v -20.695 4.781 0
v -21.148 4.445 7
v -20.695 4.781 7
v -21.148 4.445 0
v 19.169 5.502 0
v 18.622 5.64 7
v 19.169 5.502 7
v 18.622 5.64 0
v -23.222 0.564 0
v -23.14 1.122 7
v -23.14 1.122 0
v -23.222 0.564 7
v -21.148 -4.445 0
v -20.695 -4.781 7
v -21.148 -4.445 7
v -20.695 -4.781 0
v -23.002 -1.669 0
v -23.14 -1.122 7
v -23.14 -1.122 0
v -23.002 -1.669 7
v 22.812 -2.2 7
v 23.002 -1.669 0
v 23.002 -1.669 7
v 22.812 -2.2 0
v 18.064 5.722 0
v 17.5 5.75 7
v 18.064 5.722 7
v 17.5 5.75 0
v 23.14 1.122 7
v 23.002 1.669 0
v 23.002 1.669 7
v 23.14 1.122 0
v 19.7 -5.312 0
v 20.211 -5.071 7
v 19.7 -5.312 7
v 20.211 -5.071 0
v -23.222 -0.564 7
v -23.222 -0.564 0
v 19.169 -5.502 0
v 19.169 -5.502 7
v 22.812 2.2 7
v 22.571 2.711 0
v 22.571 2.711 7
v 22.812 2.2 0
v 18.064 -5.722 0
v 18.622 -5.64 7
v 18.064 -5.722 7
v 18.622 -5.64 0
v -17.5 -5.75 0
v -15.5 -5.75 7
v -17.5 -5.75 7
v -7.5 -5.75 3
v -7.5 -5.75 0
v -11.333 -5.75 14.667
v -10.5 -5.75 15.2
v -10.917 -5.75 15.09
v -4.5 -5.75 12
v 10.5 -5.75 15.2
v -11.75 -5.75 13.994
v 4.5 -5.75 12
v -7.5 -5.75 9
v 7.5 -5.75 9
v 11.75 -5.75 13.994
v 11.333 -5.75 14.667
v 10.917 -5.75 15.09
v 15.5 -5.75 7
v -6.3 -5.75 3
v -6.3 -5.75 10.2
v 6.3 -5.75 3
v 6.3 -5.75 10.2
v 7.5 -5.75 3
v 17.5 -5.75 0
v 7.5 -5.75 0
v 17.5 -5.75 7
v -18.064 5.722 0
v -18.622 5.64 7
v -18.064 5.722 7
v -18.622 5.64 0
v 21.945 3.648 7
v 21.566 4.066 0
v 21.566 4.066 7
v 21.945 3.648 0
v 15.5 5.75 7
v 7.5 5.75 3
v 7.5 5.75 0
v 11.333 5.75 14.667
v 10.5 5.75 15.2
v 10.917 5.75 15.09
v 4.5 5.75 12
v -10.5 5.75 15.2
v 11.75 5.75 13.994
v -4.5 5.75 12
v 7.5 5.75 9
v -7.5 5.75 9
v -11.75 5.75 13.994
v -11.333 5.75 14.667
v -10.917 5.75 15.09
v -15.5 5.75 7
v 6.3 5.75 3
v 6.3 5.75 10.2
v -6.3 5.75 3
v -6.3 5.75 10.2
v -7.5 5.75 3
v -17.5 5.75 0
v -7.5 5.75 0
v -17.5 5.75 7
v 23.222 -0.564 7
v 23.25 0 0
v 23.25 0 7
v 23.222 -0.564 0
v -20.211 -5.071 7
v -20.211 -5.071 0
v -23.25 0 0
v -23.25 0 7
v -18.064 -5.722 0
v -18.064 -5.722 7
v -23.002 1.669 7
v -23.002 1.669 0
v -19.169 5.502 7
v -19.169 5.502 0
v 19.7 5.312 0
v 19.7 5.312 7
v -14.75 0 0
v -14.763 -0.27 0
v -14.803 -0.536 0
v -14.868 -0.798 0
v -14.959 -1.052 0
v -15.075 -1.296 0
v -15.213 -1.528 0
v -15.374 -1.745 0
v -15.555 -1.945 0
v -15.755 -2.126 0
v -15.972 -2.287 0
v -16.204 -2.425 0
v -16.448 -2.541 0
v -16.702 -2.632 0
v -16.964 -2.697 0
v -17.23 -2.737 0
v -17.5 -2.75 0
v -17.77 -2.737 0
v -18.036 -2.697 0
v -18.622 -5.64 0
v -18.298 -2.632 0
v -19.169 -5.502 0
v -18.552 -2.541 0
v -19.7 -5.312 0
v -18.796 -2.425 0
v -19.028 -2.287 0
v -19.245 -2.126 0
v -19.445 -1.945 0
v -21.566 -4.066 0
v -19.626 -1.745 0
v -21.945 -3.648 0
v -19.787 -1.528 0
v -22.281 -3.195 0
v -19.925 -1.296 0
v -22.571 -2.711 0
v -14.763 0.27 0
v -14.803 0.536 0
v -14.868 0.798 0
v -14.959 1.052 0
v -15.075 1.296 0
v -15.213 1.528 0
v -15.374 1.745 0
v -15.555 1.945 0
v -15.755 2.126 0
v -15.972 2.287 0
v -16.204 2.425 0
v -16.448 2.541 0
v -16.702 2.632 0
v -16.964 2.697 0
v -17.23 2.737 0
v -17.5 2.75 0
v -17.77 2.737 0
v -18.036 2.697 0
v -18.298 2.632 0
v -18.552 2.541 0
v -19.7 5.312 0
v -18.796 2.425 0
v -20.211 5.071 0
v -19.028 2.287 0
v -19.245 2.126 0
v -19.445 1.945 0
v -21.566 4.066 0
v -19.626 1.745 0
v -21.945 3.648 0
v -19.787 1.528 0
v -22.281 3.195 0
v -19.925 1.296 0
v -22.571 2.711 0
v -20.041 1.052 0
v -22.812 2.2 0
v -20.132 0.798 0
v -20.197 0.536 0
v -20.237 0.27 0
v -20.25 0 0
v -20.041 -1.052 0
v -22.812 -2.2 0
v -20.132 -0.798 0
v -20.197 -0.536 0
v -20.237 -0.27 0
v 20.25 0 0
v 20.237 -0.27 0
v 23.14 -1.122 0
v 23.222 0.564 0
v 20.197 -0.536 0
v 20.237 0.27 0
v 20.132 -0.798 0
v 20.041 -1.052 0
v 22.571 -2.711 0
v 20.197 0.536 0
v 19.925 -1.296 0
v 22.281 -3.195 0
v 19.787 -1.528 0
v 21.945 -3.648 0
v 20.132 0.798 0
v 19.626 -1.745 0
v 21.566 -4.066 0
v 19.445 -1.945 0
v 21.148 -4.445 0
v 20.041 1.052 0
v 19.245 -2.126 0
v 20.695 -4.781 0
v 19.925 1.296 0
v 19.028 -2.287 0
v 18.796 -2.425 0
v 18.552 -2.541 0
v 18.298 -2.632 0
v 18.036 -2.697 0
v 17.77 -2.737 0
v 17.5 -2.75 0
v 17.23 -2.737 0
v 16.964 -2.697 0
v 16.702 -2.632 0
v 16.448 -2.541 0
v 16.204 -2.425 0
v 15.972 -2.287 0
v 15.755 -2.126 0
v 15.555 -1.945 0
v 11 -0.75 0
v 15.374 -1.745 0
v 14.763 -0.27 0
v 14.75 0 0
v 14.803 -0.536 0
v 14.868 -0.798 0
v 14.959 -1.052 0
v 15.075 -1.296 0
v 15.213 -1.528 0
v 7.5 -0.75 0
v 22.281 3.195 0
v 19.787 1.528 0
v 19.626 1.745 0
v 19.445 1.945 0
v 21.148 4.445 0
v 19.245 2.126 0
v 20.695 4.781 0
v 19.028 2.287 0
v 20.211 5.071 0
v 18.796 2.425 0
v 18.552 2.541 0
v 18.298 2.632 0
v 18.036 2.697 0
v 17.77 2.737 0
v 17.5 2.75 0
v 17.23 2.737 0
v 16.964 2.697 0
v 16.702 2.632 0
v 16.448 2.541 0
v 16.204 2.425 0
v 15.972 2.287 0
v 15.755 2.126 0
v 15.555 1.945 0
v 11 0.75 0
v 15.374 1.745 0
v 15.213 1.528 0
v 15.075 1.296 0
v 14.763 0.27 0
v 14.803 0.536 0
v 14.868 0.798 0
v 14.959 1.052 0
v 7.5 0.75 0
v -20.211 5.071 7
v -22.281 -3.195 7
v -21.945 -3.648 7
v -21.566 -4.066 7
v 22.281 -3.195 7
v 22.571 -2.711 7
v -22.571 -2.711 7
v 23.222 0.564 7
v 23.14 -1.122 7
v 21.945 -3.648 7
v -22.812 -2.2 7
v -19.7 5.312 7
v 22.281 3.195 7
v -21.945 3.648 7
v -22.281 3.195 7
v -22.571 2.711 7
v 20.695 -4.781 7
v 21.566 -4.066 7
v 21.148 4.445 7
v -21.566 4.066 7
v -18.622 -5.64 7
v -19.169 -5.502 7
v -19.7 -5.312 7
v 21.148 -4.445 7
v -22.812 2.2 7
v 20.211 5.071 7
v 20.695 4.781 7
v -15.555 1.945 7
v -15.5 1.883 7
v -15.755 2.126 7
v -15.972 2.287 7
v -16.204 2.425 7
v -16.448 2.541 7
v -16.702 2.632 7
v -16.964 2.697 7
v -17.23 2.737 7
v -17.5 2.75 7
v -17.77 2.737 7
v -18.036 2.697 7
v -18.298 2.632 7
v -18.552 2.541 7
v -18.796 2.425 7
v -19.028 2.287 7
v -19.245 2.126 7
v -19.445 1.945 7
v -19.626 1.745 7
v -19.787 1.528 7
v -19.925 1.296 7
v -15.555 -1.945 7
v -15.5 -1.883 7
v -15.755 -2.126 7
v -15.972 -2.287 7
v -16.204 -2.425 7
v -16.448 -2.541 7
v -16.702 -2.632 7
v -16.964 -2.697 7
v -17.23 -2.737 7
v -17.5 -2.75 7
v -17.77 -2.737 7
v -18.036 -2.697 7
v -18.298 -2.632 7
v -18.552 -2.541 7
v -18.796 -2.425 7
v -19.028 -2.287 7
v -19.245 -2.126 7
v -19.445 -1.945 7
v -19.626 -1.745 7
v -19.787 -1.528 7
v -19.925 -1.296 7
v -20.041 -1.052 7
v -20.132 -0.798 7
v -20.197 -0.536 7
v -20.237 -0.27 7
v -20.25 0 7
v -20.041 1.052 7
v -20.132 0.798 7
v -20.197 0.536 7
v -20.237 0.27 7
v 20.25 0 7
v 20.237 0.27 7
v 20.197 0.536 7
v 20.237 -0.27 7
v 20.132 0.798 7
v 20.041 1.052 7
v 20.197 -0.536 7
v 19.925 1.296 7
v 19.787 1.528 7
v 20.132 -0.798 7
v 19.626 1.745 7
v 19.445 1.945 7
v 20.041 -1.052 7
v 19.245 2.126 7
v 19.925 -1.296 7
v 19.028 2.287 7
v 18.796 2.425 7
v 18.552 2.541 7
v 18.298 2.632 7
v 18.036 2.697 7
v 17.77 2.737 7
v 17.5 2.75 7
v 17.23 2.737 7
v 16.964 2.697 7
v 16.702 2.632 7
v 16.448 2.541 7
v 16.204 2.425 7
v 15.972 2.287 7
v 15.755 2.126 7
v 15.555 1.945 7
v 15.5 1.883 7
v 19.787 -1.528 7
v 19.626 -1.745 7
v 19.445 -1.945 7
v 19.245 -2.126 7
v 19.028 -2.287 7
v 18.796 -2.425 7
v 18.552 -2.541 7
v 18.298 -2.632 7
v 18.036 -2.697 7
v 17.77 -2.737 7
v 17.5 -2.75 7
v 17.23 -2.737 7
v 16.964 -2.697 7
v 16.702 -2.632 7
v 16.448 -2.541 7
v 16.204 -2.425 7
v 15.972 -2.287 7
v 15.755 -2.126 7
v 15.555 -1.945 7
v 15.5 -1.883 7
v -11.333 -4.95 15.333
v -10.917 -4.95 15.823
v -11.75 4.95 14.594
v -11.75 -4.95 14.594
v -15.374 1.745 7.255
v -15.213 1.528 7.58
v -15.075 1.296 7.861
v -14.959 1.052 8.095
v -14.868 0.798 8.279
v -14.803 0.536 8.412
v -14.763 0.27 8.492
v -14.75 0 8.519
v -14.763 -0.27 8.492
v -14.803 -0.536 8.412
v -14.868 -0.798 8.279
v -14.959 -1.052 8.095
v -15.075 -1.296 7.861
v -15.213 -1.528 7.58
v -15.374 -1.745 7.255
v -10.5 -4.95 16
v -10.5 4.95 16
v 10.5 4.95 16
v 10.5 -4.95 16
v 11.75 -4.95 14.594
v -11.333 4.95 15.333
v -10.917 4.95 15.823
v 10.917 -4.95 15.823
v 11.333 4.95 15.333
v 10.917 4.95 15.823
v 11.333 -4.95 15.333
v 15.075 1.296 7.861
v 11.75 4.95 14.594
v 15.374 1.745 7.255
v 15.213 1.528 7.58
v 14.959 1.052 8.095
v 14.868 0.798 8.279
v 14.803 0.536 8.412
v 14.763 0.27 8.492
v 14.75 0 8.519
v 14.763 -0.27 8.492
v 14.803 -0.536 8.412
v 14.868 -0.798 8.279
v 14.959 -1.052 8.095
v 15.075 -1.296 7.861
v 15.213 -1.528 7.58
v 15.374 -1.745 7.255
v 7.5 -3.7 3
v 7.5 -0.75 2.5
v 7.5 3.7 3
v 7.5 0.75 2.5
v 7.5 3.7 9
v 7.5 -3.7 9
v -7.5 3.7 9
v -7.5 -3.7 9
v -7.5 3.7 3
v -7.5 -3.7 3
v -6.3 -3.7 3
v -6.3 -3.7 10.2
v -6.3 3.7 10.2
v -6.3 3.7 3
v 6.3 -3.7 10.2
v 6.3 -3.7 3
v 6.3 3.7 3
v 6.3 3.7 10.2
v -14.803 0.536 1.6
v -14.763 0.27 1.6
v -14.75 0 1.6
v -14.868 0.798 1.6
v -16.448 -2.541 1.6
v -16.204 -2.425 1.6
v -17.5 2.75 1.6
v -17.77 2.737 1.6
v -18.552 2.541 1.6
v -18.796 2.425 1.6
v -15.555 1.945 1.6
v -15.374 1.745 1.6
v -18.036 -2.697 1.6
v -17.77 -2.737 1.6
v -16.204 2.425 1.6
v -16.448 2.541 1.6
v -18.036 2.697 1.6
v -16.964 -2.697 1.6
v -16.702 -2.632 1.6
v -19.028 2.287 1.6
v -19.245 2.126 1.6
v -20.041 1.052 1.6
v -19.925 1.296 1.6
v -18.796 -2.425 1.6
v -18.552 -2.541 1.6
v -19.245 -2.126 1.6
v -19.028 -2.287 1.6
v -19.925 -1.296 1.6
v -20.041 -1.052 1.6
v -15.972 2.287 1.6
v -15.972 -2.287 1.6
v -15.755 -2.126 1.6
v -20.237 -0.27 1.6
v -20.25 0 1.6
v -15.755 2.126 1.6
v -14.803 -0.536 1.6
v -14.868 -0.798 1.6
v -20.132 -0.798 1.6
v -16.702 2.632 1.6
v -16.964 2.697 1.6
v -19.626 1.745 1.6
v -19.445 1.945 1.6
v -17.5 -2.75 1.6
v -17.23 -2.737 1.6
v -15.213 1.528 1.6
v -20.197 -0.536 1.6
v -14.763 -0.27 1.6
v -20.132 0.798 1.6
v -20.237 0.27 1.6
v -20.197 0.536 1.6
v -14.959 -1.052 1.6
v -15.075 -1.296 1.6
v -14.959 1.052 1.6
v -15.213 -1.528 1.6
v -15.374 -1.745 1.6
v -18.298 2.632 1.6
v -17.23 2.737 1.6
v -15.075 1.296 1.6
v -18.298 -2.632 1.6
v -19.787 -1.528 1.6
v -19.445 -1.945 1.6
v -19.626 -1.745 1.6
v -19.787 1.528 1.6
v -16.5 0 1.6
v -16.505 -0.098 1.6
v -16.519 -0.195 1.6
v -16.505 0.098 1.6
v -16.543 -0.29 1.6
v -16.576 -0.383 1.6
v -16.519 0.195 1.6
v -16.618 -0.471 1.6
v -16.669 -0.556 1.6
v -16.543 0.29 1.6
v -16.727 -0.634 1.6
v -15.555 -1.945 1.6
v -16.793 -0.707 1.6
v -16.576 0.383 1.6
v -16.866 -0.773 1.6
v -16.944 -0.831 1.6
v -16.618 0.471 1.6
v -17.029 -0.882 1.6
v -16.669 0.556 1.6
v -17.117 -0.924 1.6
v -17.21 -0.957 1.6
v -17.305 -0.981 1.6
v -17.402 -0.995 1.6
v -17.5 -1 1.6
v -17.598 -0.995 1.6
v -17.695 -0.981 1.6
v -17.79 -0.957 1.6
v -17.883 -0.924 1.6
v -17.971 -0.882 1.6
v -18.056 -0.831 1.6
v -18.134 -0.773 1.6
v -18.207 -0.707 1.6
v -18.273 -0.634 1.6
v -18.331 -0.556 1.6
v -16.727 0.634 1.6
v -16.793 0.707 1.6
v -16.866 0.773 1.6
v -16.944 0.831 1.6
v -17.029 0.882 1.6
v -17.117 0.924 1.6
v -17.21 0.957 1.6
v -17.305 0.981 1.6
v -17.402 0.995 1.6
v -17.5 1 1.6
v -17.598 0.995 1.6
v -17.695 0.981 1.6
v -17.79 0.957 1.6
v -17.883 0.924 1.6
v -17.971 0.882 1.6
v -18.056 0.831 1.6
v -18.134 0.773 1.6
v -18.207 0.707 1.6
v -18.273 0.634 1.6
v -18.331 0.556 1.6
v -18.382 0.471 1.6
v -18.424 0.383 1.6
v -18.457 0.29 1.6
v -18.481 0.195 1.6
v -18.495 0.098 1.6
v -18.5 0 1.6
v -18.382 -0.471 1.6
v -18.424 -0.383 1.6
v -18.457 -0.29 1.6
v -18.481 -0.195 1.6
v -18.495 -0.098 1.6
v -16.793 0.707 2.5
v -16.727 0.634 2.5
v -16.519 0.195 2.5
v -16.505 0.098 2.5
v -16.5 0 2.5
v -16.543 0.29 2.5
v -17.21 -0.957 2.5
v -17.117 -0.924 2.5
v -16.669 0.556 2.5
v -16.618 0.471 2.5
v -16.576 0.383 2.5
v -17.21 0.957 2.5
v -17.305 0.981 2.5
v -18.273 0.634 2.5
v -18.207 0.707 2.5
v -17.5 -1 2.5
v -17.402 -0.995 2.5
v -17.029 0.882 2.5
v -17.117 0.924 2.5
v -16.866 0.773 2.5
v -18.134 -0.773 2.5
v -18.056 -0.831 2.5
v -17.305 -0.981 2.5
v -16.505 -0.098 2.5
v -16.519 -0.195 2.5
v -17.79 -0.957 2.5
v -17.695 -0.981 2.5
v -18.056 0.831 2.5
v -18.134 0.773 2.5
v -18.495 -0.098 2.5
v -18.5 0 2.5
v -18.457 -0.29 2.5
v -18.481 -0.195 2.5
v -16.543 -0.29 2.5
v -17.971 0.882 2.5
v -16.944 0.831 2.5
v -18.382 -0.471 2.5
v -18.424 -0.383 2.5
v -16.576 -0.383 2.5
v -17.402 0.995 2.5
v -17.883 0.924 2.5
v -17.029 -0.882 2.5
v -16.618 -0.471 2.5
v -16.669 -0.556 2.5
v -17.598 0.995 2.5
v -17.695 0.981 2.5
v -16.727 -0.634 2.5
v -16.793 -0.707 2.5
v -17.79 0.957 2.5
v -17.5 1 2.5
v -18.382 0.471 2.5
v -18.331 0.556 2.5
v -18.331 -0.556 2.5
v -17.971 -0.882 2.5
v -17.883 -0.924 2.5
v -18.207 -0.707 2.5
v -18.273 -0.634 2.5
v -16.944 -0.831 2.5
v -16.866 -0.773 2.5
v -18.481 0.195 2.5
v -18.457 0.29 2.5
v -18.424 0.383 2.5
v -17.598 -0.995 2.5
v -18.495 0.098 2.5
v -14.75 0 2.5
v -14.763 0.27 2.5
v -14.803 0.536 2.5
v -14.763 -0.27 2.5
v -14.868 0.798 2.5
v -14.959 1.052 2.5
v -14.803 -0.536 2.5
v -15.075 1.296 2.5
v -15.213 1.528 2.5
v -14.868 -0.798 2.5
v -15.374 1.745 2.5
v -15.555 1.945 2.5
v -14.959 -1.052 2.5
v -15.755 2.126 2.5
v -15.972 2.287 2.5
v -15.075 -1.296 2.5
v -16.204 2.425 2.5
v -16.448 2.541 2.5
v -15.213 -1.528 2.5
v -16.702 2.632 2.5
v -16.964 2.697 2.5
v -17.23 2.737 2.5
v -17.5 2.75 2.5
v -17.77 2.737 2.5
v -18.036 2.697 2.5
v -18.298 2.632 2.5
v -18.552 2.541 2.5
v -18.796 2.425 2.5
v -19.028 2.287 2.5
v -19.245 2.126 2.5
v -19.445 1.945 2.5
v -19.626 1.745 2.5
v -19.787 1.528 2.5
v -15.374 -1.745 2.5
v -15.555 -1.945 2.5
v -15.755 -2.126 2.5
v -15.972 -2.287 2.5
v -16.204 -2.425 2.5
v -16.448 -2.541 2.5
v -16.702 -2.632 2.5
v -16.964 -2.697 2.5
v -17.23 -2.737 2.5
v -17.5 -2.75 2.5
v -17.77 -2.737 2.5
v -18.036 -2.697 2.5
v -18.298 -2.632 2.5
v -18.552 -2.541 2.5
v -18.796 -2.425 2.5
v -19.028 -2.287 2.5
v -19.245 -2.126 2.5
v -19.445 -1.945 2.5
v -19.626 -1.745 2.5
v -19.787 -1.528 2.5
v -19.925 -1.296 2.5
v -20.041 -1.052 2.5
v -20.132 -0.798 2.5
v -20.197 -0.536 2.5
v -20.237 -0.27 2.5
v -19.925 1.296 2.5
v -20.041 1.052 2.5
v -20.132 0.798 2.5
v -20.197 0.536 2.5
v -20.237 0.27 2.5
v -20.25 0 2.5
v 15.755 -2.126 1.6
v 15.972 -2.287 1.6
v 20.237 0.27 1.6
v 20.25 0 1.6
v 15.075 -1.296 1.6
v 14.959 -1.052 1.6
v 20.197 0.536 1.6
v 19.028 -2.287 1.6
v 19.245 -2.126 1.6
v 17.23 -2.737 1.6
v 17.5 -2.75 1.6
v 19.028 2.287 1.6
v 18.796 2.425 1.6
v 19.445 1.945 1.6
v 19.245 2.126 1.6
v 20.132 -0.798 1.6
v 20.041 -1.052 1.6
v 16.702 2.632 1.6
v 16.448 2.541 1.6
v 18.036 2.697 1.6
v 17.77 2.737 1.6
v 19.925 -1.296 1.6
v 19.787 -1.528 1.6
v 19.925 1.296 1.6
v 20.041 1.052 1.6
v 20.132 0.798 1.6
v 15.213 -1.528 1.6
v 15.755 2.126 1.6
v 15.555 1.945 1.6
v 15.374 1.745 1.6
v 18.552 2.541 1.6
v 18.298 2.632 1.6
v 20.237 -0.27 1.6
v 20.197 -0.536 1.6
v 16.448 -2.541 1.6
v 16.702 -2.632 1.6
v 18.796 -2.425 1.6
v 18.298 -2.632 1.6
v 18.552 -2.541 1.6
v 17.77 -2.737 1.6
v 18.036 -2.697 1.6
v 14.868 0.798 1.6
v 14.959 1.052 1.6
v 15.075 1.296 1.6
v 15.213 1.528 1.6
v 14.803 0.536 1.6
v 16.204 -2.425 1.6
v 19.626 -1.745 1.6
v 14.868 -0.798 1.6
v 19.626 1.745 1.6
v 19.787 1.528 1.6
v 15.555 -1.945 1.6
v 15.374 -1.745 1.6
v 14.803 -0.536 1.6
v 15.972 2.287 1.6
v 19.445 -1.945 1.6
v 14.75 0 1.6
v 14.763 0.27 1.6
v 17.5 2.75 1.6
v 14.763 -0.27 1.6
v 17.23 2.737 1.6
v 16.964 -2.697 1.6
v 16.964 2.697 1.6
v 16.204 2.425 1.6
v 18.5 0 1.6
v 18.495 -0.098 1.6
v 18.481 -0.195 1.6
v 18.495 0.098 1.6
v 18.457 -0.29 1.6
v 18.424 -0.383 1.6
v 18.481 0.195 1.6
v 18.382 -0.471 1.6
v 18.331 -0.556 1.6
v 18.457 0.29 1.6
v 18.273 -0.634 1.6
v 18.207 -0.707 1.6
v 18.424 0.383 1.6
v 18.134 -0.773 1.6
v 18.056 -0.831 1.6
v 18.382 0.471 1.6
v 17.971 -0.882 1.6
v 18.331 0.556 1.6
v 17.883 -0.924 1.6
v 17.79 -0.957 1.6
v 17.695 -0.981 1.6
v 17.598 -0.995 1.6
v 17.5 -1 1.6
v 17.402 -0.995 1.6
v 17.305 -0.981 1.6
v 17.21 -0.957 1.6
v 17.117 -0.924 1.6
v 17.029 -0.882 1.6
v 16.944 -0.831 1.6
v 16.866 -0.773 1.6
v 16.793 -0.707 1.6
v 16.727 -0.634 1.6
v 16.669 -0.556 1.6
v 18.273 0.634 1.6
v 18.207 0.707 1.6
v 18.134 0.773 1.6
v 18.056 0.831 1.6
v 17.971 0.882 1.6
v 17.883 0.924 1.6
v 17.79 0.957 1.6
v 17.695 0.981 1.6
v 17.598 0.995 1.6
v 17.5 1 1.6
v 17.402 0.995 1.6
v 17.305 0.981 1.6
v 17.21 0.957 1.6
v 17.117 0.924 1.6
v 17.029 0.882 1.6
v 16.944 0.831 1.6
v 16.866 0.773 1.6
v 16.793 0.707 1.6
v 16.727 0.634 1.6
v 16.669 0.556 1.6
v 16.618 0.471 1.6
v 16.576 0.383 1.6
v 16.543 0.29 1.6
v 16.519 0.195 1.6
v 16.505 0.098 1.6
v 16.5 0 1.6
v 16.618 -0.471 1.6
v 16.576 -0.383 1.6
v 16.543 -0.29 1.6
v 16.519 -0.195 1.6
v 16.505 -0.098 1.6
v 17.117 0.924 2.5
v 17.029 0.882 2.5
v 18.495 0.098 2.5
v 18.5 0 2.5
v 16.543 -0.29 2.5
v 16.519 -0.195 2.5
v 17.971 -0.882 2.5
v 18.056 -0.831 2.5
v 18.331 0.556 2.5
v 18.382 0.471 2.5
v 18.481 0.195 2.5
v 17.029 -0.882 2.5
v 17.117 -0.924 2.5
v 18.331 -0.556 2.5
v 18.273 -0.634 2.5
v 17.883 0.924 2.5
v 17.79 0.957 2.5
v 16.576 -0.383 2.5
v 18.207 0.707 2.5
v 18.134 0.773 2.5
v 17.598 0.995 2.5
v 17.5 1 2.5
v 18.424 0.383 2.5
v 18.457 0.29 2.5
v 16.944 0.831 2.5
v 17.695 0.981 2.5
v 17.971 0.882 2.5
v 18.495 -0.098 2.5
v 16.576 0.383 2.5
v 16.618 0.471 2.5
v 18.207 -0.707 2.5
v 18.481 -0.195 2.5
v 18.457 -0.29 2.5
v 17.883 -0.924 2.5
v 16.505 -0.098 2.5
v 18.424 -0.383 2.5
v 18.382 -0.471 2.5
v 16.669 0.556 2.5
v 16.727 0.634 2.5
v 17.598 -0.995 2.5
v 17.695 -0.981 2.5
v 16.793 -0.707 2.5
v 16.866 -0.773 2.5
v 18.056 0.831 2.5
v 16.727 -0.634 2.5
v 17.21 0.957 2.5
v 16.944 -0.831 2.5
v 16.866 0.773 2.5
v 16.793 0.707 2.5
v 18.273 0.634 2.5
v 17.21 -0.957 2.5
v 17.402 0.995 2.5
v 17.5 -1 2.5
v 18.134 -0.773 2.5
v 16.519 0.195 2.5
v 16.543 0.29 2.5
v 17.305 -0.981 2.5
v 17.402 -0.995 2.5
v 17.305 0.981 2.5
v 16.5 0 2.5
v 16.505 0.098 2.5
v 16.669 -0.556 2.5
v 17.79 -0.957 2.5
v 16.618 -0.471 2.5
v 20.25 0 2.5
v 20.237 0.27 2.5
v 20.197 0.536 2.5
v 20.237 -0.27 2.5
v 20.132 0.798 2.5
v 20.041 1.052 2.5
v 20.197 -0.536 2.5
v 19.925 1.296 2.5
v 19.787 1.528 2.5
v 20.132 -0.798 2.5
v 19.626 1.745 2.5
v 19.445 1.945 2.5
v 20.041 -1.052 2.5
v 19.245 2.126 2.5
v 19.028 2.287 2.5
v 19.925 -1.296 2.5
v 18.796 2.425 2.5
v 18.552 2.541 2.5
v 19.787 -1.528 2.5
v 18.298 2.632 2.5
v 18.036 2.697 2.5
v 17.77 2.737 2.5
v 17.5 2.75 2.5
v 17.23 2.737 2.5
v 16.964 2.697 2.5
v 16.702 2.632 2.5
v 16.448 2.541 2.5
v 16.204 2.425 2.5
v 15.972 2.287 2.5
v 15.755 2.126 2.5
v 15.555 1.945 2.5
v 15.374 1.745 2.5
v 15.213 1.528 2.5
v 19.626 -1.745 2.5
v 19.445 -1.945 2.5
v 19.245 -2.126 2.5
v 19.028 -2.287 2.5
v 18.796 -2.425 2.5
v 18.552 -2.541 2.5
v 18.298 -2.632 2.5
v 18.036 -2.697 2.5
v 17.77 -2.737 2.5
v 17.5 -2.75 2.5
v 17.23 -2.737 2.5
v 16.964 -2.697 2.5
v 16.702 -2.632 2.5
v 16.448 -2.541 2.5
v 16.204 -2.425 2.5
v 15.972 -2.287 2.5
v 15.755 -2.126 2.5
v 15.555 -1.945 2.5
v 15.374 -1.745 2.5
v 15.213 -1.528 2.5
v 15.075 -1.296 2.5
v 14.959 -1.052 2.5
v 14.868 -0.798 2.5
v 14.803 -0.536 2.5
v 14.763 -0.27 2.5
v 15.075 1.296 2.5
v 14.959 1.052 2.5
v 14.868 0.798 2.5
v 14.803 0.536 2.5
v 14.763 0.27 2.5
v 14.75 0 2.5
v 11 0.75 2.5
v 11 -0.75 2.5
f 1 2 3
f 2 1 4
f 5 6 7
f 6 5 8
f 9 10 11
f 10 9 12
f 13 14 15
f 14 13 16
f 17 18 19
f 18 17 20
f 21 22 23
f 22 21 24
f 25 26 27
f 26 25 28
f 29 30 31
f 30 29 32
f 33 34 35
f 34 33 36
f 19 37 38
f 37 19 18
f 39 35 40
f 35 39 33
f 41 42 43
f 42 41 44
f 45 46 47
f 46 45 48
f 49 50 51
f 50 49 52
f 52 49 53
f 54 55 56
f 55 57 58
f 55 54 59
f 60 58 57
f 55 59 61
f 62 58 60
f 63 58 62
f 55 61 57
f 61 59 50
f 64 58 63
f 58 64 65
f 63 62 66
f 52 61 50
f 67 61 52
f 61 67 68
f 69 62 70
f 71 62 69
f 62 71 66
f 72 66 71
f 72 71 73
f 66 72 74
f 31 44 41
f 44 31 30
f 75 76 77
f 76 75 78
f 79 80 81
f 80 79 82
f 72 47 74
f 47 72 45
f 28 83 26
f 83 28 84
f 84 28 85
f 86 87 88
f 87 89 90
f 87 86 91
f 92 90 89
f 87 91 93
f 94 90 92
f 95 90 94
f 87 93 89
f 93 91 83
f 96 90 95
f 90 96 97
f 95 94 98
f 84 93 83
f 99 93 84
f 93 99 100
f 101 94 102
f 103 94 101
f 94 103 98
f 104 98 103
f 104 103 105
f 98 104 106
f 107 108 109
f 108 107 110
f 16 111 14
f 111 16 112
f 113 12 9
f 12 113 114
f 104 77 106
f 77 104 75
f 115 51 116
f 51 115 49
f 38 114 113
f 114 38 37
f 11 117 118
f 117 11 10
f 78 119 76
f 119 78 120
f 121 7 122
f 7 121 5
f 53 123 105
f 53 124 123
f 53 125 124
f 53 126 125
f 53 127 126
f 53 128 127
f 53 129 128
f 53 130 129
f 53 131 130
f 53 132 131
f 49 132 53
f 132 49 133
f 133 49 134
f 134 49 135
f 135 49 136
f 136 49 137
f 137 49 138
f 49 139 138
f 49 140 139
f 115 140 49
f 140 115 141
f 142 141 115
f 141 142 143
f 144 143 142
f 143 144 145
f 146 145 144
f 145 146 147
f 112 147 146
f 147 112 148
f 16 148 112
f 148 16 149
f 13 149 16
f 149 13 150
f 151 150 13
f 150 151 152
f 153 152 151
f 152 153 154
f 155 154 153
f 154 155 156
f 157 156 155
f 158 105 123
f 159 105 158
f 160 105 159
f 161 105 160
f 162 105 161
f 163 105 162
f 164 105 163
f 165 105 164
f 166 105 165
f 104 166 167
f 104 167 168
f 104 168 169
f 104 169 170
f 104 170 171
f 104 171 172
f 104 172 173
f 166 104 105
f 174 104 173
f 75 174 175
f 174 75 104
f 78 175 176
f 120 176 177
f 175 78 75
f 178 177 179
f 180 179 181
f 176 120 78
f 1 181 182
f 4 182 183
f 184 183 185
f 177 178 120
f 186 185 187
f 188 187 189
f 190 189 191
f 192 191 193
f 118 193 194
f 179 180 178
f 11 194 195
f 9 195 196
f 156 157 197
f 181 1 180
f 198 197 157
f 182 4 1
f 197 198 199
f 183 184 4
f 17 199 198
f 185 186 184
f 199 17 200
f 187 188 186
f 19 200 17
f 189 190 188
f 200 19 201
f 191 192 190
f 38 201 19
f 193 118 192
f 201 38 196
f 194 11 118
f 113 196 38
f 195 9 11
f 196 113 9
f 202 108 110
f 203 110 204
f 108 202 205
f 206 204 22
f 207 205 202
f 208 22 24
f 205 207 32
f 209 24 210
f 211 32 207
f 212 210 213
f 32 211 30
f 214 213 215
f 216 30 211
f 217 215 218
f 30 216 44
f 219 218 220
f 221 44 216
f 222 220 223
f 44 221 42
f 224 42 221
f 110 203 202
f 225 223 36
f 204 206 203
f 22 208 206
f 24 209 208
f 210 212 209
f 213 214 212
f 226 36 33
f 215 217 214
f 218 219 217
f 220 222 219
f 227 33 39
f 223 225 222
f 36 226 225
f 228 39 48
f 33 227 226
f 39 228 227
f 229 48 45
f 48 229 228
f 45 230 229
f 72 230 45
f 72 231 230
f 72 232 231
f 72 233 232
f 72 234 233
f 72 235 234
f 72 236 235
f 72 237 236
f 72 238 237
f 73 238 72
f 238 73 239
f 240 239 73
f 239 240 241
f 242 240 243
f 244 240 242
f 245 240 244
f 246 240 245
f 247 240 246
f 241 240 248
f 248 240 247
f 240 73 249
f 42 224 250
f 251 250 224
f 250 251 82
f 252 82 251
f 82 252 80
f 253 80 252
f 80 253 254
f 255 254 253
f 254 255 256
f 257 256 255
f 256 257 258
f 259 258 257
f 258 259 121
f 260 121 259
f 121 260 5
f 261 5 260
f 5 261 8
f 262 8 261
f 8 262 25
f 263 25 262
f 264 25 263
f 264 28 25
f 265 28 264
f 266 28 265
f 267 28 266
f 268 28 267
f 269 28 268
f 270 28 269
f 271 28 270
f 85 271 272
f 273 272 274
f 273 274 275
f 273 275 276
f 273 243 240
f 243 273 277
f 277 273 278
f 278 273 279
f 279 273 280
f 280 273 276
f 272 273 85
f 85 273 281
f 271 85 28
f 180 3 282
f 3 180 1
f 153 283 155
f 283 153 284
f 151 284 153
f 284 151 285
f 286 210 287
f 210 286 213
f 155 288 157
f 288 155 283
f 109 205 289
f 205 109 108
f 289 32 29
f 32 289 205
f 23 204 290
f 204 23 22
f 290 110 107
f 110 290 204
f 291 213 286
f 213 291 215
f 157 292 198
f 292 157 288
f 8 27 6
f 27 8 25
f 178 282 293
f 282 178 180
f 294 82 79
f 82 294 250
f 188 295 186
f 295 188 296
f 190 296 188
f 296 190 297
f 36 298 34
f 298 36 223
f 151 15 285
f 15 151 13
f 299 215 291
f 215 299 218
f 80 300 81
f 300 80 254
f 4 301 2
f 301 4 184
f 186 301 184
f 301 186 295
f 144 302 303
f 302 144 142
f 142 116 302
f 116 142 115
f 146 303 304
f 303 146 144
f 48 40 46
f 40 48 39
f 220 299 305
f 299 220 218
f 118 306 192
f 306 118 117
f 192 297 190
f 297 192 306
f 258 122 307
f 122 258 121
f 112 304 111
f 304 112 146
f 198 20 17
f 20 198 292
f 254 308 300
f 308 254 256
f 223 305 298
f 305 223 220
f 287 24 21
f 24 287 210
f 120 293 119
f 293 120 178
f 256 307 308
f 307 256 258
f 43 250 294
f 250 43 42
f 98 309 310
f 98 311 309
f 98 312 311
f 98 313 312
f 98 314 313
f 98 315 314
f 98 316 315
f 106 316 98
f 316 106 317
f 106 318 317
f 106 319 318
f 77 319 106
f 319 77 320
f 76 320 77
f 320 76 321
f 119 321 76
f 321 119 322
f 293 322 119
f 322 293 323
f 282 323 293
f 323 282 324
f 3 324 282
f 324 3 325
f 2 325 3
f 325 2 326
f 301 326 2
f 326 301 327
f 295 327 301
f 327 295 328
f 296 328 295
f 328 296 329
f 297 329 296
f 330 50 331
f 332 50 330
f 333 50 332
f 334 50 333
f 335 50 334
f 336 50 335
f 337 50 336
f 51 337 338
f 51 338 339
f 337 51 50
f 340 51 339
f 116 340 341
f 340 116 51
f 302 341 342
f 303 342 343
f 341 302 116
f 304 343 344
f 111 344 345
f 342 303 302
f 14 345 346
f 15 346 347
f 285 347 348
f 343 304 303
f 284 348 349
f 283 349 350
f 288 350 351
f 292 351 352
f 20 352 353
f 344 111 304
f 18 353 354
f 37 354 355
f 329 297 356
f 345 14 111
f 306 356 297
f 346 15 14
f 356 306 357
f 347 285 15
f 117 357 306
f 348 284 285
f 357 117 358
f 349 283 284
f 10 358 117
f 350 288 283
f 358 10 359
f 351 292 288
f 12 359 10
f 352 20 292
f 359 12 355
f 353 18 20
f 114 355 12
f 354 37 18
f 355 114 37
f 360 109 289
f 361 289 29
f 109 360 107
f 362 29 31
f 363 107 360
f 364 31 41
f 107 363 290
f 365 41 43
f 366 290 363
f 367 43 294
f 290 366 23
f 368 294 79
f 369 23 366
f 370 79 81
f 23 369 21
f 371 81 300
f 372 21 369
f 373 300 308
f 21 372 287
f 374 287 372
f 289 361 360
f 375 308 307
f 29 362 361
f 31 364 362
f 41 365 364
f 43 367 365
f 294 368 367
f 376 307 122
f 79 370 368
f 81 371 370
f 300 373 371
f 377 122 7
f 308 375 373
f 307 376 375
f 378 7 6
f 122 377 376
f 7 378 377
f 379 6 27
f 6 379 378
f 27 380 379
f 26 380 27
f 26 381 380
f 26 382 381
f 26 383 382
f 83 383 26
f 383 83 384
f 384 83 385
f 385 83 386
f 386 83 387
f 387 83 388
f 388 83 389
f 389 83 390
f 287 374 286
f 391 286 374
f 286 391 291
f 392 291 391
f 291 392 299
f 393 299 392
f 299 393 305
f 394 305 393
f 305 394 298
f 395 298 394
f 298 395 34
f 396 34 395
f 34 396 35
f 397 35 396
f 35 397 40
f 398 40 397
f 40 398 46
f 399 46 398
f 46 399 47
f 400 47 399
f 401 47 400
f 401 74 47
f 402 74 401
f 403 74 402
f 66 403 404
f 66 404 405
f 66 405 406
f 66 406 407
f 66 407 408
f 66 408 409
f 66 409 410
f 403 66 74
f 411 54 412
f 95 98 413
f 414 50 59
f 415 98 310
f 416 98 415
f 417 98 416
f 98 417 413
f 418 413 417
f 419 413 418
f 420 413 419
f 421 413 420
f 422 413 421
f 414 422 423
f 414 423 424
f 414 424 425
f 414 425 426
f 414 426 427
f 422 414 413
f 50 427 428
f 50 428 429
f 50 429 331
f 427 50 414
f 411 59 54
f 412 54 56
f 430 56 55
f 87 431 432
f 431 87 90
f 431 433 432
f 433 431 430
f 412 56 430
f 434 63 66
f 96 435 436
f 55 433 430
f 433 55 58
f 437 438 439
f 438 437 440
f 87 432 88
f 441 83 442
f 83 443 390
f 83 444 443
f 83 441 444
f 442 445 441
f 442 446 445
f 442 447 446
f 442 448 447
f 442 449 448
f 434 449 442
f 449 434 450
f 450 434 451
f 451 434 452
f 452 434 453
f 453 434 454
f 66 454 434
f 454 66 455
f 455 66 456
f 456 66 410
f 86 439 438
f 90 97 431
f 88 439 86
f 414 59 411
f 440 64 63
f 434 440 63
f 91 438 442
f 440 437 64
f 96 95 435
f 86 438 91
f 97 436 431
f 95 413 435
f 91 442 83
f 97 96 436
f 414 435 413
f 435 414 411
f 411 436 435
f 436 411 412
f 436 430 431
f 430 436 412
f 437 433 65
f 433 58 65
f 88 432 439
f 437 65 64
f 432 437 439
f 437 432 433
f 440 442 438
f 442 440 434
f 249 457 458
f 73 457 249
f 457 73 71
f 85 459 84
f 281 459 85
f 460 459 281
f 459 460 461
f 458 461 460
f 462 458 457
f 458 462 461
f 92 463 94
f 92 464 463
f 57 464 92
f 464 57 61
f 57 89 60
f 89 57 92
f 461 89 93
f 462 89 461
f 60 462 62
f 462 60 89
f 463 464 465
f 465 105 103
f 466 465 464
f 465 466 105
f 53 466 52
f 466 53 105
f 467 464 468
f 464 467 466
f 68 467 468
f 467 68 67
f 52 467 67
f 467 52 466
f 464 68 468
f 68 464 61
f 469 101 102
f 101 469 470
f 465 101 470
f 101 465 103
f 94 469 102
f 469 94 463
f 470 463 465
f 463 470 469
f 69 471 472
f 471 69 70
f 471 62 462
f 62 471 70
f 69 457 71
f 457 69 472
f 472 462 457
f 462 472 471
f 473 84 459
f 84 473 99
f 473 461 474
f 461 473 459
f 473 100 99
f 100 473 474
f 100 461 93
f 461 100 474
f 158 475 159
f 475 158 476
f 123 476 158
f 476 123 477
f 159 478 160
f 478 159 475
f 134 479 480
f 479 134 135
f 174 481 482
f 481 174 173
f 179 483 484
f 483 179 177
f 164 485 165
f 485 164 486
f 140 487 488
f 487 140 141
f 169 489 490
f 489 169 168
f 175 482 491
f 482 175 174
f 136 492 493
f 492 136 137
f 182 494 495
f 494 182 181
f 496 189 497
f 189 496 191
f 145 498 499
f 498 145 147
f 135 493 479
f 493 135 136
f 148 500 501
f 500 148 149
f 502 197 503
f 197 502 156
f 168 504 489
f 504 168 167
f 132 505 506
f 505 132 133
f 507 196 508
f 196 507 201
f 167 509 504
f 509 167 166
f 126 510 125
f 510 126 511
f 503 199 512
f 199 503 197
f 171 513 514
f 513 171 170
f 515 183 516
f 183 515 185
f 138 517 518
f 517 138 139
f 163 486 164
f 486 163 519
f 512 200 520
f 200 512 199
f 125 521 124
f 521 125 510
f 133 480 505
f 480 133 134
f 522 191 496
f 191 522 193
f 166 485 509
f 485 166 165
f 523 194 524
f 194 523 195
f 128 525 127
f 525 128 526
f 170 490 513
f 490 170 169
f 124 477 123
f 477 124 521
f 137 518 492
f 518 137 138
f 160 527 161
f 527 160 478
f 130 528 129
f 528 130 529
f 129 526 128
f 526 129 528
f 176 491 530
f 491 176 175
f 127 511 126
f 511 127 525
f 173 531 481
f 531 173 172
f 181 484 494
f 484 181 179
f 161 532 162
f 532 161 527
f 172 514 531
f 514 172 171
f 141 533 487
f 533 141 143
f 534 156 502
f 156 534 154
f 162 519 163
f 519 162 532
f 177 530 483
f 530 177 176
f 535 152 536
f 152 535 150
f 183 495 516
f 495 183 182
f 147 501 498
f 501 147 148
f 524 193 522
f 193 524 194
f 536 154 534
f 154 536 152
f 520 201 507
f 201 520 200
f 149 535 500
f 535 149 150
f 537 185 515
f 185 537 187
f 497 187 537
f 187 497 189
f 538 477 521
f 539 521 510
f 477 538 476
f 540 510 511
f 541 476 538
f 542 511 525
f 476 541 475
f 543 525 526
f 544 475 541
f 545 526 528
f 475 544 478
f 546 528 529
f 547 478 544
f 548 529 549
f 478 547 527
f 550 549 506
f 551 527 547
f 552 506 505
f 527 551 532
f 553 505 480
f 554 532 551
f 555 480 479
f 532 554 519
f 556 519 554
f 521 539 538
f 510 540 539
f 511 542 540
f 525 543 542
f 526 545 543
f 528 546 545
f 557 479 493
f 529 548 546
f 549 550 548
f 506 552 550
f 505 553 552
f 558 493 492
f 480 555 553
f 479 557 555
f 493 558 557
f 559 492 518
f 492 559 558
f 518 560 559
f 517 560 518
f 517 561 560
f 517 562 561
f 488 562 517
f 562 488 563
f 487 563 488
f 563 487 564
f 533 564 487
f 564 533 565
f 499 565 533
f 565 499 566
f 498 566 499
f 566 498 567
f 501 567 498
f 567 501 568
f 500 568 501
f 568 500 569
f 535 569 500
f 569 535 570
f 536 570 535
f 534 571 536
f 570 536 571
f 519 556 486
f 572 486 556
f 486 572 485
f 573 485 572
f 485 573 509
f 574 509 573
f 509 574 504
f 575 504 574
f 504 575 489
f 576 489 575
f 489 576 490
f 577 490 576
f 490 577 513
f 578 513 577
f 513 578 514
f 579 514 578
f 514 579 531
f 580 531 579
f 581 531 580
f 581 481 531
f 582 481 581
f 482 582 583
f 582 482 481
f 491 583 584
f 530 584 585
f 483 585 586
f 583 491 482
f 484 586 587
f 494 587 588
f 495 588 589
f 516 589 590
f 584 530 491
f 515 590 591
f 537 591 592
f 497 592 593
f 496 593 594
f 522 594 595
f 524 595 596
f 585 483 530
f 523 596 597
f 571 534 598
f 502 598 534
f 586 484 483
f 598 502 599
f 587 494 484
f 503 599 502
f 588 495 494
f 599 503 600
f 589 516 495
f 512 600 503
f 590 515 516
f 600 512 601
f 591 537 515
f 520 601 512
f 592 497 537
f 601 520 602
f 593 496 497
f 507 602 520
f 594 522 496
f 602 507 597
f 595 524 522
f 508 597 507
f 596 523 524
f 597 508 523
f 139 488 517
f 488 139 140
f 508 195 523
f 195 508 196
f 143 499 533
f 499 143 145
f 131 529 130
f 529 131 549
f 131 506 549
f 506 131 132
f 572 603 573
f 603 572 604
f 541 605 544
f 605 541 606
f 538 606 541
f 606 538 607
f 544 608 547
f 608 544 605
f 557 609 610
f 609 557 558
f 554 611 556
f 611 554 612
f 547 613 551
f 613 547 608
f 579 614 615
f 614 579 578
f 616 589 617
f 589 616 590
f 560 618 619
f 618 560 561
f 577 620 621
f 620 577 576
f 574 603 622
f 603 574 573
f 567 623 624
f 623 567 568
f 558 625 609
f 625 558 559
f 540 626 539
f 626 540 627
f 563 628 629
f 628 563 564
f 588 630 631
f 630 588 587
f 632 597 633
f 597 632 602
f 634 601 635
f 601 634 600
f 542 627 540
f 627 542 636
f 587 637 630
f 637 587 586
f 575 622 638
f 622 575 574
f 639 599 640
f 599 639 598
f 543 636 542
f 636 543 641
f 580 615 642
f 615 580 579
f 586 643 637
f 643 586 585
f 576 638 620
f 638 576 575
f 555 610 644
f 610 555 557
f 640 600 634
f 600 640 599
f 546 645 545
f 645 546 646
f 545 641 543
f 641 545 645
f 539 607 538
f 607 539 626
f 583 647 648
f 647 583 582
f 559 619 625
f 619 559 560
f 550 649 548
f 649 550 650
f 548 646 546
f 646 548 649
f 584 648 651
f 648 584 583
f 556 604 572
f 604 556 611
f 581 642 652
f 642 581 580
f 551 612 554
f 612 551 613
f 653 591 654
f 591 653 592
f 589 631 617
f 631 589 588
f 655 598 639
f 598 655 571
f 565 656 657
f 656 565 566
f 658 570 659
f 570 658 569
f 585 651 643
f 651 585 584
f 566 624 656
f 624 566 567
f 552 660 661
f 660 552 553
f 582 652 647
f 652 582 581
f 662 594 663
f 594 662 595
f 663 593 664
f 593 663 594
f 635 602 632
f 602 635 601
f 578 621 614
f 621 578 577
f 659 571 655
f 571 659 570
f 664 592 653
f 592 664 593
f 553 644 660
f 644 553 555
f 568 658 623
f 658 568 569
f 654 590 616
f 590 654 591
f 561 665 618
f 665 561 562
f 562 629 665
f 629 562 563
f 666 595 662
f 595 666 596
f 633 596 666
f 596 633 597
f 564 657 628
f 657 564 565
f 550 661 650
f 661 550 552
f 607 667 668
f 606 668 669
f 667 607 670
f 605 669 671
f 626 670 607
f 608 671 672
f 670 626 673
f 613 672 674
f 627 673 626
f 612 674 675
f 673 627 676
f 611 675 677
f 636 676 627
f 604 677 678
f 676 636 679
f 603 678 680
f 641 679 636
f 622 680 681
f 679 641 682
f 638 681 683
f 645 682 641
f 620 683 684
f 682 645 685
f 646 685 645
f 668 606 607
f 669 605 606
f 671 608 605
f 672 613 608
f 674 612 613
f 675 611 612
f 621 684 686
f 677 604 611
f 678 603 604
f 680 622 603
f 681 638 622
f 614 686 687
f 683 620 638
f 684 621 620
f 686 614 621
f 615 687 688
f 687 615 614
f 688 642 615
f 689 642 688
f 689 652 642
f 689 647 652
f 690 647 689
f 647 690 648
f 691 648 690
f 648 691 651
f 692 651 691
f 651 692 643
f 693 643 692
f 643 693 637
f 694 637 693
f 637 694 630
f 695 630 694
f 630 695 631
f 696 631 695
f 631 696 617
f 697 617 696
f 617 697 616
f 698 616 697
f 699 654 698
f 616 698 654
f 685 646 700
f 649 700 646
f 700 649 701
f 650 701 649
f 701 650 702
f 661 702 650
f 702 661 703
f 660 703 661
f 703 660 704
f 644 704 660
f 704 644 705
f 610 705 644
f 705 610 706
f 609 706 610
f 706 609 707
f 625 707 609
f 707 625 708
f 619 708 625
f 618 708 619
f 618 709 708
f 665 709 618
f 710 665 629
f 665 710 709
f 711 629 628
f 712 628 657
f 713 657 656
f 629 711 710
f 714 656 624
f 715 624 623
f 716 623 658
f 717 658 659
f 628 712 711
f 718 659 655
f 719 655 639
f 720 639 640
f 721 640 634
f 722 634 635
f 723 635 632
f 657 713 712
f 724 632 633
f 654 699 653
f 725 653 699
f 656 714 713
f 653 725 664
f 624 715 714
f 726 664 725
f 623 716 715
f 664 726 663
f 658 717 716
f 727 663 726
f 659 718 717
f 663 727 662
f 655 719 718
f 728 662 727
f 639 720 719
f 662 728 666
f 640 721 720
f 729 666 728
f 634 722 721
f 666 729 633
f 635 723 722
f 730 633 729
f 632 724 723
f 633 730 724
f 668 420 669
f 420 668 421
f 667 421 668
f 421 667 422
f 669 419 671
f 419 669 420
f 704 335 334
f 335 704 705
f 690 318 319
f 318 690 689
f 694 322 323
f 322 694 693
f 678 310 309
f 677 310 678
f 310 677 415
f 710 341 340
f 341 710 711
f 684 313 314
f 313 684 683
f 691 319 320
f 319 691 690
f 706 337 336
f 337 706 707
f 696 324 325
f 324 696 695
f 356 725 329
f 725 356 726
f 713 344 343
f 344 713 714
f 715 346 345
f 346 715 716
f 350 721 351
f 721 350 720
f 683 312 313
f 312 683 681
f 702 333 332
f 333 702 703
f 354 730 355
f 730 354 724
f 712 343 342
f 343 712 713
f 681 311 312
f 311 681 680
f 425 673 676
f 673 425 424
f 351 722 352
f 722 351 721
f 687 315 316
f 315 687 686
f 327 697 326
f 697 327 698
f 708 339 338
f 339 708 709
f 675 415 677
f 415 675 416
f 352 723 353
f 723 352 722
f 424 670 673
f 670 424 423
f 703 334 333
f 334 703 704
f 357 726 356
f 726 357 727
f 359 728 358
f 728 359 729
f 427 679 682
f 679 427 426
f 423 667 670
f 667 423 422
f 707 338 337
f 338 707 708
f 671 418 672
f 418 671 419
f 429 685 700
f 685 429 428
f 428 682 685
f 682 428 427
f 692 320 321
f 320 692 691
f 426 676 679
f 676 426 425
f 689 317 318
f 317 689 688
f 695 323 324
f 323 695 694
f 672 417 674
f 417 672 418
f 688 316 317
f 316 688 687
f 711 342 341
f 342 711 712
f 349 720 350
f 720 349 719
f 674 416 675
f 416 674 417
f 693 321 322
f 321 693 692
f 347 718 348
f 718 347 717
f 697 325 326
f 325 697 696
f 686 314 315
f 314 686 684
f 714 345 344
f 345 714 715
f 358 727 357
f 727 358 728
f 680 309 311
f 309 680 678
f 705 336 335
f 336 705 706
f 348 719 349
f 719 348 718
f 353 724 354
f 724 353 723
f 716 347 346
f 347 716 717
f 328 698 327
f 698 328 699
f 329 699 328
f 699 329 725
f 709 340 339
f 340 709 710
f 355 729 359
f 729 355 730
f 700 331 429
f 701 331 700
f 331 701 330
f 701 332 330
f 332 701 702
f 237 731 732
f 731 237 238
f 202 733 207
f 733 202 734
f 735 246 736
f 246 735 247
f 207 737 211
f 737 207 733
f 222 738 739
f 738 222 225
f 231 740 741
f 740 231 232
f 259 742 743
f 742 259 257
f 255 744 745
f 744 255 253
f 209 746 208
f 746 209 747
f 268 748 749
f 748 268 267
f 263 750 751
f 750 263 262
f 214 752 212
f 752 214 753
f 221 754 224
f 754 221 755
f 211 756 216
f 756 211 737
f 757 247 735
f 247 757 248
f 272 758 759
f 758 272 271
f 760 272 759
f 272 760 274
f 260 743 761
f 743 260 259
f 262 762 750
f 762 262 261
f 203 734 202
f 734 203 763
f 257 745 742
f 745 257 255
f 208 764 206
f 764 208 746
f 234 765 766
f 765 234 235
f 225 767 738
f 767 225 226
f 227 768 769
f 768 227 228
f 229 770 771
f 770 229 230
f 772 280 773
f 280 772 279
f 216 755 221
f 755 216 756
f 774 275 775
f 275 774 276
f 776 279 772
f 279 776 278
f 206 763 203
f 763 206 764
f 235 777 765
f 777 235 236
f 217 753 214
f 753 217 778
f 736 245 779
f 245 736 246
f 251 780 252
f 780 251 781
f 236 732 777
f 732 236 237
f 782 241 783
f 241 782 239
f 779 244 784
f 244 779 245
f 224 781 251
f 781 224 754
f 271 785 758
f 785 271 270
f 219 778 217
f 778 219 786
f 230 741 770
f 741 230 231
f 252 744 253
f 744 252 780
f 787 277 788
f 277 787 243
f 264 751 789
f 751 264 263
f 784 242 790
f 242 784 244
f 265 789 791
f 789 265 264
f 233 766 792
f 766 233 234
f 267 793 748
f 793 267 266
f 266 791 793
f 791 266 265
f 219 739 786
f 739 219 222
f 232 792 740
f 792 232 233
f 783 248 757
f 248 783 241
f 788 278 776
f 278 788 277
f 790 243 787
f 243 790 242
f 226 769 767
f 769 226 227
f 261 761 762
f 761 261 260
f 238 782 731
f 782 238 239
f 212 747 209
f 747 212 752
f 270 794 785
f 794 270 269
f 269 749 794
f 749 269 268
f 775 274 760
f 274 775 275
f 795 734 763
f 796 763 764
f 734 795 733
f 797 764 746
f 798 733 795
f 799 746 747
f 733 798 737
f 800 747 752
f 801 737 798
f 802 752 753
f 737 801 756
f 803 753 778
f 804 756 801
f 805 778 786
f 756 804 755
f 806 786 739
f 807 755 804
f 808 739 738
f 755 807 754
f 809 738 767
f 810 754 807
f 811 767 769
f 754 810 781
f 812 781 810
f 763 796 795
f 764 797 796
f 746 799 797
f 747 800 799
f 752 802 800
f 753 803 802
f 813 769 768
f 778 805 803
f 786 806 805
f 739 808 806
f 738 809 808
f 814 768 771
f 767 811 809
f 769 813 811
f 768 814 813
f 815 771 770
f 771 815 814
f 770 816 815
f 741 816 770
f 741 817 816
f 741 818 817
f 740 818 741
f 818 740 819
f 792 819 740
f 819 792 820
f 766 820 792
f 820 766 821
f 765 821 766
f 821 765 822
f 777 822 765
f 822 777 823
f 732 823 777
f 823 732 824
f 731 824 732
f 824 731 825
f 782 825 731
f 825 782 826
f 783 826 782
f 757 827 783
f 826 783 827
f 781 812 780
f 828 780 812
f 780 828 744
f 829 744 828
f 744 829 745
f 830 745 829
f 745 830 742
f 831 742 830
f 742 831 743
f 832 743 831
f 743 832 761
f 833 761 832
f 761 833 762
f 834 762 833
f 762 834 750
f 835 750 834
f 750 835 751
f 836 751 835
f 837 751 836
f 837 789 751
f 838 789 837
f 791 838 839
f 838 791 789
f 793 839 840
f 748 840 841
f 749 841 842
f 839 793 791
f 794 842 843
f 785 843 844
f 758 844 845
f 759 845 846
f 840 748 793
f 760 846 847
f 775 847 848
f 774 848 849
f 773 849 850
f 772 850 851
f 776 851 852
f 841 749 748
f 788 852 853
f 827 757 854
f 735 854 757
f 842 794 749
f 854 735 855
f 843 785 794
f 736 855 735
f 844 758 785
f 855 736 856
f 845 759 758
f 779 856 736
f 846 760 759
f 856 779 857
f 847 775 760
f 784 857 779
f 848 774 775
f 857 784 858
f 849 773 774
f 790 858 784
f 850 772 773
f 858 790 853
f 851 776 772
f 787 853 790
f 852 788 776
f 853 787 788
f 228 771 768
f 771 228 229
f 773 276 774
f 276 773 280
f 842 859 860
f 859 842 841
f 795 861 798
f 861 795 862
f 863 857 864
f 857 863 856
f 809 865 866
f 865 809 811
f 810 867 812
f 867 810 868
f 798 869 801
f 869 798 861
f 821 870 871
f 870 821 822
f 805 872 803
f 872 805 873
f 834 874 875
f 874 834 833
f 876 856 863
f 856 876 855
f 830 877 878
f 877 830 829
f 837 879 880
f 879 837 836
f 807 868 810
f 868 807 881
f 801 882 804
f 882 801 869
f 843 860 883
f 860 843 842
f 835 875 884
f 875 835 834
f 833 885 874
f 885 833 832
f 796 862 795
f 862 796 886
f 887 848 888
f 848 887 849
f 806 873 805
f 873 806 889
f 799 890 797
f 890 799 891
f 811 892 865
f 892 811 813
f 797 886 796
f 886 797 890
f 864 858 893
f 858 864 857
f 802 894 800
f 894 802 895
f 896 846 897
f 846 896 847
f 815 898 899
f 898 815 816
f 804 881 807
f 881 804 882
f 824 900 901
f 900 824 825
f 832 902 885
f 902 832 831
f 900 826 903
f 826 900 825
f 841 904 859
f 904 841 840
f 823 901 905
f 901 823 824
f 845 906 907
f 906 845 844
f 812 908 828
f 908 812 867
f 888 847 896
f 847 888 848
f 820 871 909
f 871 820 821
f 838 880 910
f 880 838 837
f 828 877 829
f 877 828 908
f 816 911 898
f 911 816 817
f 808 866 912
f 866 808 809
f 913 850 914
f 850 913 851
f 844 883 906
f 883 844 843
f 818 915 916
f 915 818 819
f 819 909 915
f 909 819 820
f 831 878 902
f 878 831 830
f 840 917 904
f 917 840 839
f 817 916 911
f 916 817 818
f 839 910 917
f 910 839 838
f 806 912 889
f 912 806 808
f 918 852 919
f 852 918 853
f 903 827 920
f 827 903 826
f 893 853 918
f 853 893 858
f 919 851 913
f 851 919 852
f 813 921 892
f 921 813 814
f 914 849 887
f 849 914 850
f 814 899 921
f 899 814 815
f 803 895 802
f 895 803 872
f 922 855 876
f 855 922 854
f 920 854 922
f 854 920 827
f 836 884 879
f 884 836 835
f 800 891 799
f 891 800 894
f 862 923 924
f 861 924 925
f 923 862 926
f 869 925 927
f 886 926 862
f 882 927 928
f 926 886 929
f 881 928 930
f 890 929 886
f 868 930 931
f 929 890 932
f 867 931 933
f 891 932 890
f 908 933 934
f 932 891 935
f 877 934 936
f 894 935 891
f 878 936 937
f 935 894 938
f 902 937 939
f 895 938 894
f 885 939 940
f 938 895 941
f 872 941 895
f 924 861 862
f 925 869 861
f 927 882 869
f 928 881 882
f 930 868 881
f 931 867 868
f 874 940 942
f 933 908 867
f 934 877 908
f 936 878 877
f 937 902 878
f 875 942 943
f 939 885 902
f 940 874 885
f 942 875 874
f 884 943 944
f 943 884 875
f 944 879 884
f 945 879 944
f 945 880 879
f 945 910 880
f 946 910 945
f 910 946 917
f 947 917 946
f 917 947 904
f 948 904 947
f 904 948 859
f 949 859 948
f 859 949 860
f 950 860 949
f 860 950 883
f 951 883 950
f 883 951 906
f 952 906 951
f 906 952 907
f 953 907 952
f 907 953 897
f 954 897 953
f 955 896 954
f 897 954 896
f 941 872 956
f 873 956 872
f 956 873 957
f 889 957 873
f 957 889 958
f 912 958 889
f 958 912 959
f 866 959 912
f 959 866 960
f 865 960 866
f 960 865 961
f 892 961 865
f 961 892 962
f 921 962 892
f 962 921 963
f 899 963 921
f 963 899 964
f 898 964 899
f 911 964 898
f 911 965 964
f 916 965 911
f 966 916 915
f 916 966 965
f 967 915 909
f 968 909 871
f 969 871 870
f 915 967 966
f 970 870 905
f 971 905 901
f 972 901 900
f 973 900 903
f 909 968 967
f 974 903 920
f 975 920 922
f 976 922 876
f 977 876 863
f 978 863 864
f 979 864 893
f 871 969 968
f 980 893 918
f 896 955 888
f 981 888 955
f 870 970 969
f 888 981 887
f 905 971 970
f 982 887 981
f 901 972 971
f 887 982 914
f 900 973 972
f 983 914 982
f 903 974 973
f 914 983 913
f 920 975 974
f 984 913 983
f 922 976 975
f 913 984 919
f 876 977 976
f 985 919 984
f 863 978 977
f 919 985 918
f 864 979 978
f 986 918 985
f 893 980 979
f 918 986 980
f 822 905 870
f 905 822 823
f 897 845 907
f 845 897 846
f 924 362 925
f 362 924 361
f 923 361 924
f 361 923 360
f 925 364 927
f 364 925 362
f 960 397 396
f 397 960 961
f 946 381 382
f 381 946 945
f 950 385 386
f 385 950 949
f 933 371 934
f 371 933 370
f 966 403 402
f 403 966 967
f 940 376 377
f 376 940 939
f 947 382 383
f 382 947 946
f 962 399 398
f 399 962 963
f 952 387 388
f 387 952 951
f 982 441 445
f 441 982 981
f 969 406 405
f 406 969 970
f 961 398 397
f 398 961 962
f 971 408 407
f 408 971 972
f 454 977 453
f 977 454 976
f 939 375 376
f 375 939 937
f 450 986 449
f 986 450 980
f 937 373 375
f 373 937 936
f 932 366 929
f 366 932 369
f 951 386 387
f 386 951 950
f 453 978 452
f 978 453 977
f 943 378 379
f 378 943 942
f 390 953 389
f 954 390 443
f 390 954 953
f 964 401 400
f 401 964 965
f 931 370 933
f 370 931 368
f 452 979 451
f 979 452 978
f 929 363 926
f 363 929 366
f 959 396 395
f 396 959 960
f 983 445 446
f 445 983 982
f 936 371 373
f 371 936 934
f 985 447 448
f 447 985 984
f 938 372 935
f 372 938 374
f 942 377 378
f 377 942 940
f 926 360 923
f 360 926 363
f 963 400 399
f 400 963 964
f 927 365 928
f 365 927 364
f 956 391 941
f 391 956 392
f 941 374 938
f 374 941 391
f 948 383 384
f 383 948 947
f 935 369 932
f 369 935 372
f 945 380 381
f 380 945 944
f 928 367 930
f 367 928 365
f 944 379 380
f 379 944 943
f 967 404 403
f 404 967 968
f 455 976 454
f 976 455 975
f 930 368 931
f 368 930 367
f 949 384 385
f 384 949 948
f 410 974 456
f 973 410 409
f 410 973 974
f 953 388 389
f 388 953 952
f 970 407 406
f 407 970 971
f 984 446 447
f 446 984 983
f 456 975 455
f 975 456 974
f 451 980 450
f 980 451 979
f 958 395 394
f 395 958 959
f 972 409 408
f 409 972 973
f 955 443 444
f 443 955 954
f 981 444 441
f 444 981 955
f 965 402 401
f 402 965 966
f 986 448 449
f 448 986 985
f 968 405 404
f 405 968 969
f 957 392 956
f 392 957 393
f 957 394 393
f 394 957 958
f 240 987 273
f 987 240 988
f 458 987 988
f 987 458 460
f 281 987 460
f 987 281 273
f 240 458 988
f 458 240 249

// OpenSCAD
// Walkie Talkie Carabiner Attachment Arch
// This arch attaches to a walkie talkie via two studs and provides
// a permanent carabiner attachment point.

// ============================================
// DIMENSIONS
// ============================================

// Basic pill shape dimensions
attachment_length = 46.5;    // Length of the walkie talkie attachment
attachment_width = 11.5;     // Width of the walkie talkie attachment
attachment_height = 7;       // Height/tall dimension (Z direction)
rounding_diameter = attachment_width; // Diameter of the rounding (matches width)

// Screw hole dimensions
stud_hole_diameter = 5.5;       // Bottom hole for stud (5mm wide)
stud_hole_depth = 1.6;        // Depth of stud hole (1.6mm)
screw_shaft_diameter = 2;     // Screw shaft diameter (2mm)
screw_head_diameter = 5.5;    // Screw head diameter (5.5mm)
screw_head_start = 2.5;         // Height where screw head starts (4mm from bottom)

// Arch cutout dimensions
arch_cutout_width = 15;      // Width of the arch cutout (X direction)
carabiner_clearance_height = 12; // Height above Z=0 for the carabiner opening
arch_top_thickness = 4;      // Material thickness above the carabiner opening
arch_shoulder_width = 3;     // Extra material on each side of the opening
arch_ramp_width = 5;         // Width of each sloped shoulder above the base
arch_profile_steps = 12;     // Smoothness of each curved shoulder
top_edge_chamfer = 0.8;      // Chamfer around the raised bridge top edge
inner_arch_chamfer = 3;      // Chamfer on the upper inside corners of the opening
arch_top_height = carabiner_clearance_height + arch_top_thickness;

// TPU insert side guide dimensions
tpu_insert_width = 7;
tpu_insert_y_clearance = 0.4;
tpu_insert_bottom_trim = 3;
tpu_side_guide_x = 1.2;

// Keying slot dimensions
keying_slot_y = 1.5;    // Width of the keying slot (Y direction, perpendicular to line)
keying_slot_z = 2.5;    // Depth of the keying slot (Z direction)
keying_slot_x = 3.5;  // Distance extending from cutout edge (X direction)

// Quality settings
$fn = 64;  // Number of fragments for circles/cylinders (higher = smoother, slower to render)


// ============================================
// MAIN ARCH MODEL
// ============================================
// Coordinate system:
// X: along the length (left to right)
// Y: width (front to back)
// Z: height/tall (upward)

module attachment_profile() {
    hull() {
        translate([-attachment_length/2 + rounding_diameter/2, 0])
            circle(d=rounding_diameter);

        translate([attachment_length/2 - rounding_diameter/2, 0])
            circle(d=rounding_diameter);
    }
}

module xz_extrude(width) {
    translate([0, width/2, 0])
        rotate([90, 0, 0])
            linear_extrude(height=width)
                children();
}

module raised_arch_profile(top_drop=0) {
    arch_inner_half_width = arch_cutout_width/2 + arch_shoulder_width;
    arch_outer_half_width = arch_inner_half_width + arch_ramp_width;
    ramp_height = arch_top_height - attachment_height;

    polygon(concat(
        [[-arch_outer_half_width, attachment_height]],
        [
            for (i = [1:arch_profile_steps])
                let (
                    t = i/arch_profile_steps,
                    eased = 3*t*t - 2*t*t*t
                )
                    [
                        -arch_outer_half_width + arch_ramp_width*t,
                        attachment_height + ramp_height*eased - top_drop*t
                    ]
        ],
        [[arch_inner_half_width, arch_top_height - top_drop]],
        [
            for (i = [1:arch_profile_steps])
                let (
                    t = i/arch_profile_steps,
                    eased = 3*t*t - 2*t*t*t
                )
                    [
                        arch_inner_half_width + arch_ramp_width*t,
                        arch_top_height - ramp_height*eased - top_drop*(1 - t)
                    ]
        ]
    ));
}

module raised_arch_body() {
    if (top_edge_chamfer > 0) {
        hull() {
            xz_extrude(attachment_width)
                raised_arch_profile(top_drop=top_edge_chamfer);

            xz_extrude(attachment_width - 2*top_edge_chamfer)
                raised_arch_profile();
        }
    } else {
        xz_extrude(attachment_width)
            raised_arch_profile();
    }
}

module arch_cutout() {
    chamfer = min(inner_arch_chamfer, arch_cutout_width/2, carabiner_clearance_height);

    xz_extrude(attachment_width + 0.2)
        polygon([
            [-arch_cutout_width/2, 0],
            [arch_cutout_width/2, 0],
            [arch_cutout_width/2, carabiner_clearance_height - chamfer],
            [arch_cutout_width/2 - chamfer, carabiner_clearance_height],
            [-arch_cutout_width/2 + chamfer, carabiner_clearance_height],
            [-arch_cutout_width/2, carabiner_clearance_height - chamfer]
        ]);
}

module attachment_body() {
    linear_extrude(height=attachment_height)
        attachment_profile();

    // Raised bridge for carabiner clearance while keeping the screw pads low.
    raised_arch_body();
}

module cut_arch_opening() {
    difference() {
        attachment_body();
        arch_cutout();
    }
}

module tpu_side_guides() {
    guide_y_inner = tpu_insert_width/2 + tpu_insert_y_clearance/2;
    guide_y_outer = attachment_width/2;
    guide_y_width = guide_y_outer - guide_y_inner;
    guide_y_center = (guide_y_inner + guide_y_outer)/2;

    for (x_side = [-1, 1], y_side = [-1, 1])
        translate([
            0,
            y_side*guide_y_center,
            0
        ])
            xz_extrude(guide_y_width)
                if (x_side > 0) {
                    polygon([
                        [arch_cutout_width/2 - tpu_side_guide_x, tpu_insert_bottom_trim],
                        [arch_cutout_width/2, tpu_insert_bottom_trim],
                        [arch_cutout_width/2, carabiner_clearance_height - inner_arch_chamfer],
                        [arch_cutout_width/2 - tpu_side_guide_x, carabiner_clearance_height - inner_arch_chamfer + tpu_side_guide_x]
                    ]);
                } else {
                    polygon([
                        [-arch_cutout_width/2, tpu_insert_bottom_trim],
                        [-arch_cutout_width/2 + tpu_side_guide_x, tpu_insert_bottom_trim],
                        [-arch_cutout_width/2 + tpu_side_guide_x, carabiner_clearance_height - inner_arch_chamfer + tpu_side_guide_x],
                        [-arch_cutout_width/2, carabiner_clearance_height - inner_arch_chamfer]
                    ]);
                }
}

difference() {
    union() {
        cut_arch_opening();
        tpu_side_guides();
    }
    
    // Left side screw hole
    translate([-attachment_length/2 + rounding_diameter/2, 0, 0]) {
        // Bottom stud hole (5mm diameter, 1.6mm deep)
        cylinder(h=stud_hole_depth, d=stud_hole_diameter);
        
        // Screw shaft (2mm diameter, from 1.6mm to 4mm)
        translate([0, 0, stud_hole_depth])
            cylinder(h=screw_head_start - stud_hole_depth, d=screw_shaft_diameter);
        
        // Screw head clearance (5.5mm diameter, from 4mm to top)
        translate([0, 0, screw_head_start])
            cylinder(h=arch_top_height - screw_head_start + 0.1, d=screw_head_diameter);
    }
    
    // Right side screw hole
    translate([attachment_length/2 - rounding_diameter/2, 0, 0]) {
        // Bottom stud hole (5mm diameter, 1.6mm deep)
        cylinder(h=stud_hole_depth, d=stud_hole_diameter);
        
        // Screw shaft (2mm diameter, from 1.6mm to 4mm)
        translate([0, 0, stud_hole_depth])
            cylinder(h=screw_head_start - stud_hole_depth, d=screw_shaft_diameter);
        
        // Screw head clearance (5.5mm diameter, from 4mm to top)
        translate([0, 0, screw_head_start])
            cylinder(h=arch_top_height - screw_head_start + 0.1, d=screw_head_diameter);
    }
    
    translate([arch_cutout_width/2, -keying_slot_y/2, 0])
        cube([keying_slot_x, keying_slot_y, keying_slot_z]);
}
